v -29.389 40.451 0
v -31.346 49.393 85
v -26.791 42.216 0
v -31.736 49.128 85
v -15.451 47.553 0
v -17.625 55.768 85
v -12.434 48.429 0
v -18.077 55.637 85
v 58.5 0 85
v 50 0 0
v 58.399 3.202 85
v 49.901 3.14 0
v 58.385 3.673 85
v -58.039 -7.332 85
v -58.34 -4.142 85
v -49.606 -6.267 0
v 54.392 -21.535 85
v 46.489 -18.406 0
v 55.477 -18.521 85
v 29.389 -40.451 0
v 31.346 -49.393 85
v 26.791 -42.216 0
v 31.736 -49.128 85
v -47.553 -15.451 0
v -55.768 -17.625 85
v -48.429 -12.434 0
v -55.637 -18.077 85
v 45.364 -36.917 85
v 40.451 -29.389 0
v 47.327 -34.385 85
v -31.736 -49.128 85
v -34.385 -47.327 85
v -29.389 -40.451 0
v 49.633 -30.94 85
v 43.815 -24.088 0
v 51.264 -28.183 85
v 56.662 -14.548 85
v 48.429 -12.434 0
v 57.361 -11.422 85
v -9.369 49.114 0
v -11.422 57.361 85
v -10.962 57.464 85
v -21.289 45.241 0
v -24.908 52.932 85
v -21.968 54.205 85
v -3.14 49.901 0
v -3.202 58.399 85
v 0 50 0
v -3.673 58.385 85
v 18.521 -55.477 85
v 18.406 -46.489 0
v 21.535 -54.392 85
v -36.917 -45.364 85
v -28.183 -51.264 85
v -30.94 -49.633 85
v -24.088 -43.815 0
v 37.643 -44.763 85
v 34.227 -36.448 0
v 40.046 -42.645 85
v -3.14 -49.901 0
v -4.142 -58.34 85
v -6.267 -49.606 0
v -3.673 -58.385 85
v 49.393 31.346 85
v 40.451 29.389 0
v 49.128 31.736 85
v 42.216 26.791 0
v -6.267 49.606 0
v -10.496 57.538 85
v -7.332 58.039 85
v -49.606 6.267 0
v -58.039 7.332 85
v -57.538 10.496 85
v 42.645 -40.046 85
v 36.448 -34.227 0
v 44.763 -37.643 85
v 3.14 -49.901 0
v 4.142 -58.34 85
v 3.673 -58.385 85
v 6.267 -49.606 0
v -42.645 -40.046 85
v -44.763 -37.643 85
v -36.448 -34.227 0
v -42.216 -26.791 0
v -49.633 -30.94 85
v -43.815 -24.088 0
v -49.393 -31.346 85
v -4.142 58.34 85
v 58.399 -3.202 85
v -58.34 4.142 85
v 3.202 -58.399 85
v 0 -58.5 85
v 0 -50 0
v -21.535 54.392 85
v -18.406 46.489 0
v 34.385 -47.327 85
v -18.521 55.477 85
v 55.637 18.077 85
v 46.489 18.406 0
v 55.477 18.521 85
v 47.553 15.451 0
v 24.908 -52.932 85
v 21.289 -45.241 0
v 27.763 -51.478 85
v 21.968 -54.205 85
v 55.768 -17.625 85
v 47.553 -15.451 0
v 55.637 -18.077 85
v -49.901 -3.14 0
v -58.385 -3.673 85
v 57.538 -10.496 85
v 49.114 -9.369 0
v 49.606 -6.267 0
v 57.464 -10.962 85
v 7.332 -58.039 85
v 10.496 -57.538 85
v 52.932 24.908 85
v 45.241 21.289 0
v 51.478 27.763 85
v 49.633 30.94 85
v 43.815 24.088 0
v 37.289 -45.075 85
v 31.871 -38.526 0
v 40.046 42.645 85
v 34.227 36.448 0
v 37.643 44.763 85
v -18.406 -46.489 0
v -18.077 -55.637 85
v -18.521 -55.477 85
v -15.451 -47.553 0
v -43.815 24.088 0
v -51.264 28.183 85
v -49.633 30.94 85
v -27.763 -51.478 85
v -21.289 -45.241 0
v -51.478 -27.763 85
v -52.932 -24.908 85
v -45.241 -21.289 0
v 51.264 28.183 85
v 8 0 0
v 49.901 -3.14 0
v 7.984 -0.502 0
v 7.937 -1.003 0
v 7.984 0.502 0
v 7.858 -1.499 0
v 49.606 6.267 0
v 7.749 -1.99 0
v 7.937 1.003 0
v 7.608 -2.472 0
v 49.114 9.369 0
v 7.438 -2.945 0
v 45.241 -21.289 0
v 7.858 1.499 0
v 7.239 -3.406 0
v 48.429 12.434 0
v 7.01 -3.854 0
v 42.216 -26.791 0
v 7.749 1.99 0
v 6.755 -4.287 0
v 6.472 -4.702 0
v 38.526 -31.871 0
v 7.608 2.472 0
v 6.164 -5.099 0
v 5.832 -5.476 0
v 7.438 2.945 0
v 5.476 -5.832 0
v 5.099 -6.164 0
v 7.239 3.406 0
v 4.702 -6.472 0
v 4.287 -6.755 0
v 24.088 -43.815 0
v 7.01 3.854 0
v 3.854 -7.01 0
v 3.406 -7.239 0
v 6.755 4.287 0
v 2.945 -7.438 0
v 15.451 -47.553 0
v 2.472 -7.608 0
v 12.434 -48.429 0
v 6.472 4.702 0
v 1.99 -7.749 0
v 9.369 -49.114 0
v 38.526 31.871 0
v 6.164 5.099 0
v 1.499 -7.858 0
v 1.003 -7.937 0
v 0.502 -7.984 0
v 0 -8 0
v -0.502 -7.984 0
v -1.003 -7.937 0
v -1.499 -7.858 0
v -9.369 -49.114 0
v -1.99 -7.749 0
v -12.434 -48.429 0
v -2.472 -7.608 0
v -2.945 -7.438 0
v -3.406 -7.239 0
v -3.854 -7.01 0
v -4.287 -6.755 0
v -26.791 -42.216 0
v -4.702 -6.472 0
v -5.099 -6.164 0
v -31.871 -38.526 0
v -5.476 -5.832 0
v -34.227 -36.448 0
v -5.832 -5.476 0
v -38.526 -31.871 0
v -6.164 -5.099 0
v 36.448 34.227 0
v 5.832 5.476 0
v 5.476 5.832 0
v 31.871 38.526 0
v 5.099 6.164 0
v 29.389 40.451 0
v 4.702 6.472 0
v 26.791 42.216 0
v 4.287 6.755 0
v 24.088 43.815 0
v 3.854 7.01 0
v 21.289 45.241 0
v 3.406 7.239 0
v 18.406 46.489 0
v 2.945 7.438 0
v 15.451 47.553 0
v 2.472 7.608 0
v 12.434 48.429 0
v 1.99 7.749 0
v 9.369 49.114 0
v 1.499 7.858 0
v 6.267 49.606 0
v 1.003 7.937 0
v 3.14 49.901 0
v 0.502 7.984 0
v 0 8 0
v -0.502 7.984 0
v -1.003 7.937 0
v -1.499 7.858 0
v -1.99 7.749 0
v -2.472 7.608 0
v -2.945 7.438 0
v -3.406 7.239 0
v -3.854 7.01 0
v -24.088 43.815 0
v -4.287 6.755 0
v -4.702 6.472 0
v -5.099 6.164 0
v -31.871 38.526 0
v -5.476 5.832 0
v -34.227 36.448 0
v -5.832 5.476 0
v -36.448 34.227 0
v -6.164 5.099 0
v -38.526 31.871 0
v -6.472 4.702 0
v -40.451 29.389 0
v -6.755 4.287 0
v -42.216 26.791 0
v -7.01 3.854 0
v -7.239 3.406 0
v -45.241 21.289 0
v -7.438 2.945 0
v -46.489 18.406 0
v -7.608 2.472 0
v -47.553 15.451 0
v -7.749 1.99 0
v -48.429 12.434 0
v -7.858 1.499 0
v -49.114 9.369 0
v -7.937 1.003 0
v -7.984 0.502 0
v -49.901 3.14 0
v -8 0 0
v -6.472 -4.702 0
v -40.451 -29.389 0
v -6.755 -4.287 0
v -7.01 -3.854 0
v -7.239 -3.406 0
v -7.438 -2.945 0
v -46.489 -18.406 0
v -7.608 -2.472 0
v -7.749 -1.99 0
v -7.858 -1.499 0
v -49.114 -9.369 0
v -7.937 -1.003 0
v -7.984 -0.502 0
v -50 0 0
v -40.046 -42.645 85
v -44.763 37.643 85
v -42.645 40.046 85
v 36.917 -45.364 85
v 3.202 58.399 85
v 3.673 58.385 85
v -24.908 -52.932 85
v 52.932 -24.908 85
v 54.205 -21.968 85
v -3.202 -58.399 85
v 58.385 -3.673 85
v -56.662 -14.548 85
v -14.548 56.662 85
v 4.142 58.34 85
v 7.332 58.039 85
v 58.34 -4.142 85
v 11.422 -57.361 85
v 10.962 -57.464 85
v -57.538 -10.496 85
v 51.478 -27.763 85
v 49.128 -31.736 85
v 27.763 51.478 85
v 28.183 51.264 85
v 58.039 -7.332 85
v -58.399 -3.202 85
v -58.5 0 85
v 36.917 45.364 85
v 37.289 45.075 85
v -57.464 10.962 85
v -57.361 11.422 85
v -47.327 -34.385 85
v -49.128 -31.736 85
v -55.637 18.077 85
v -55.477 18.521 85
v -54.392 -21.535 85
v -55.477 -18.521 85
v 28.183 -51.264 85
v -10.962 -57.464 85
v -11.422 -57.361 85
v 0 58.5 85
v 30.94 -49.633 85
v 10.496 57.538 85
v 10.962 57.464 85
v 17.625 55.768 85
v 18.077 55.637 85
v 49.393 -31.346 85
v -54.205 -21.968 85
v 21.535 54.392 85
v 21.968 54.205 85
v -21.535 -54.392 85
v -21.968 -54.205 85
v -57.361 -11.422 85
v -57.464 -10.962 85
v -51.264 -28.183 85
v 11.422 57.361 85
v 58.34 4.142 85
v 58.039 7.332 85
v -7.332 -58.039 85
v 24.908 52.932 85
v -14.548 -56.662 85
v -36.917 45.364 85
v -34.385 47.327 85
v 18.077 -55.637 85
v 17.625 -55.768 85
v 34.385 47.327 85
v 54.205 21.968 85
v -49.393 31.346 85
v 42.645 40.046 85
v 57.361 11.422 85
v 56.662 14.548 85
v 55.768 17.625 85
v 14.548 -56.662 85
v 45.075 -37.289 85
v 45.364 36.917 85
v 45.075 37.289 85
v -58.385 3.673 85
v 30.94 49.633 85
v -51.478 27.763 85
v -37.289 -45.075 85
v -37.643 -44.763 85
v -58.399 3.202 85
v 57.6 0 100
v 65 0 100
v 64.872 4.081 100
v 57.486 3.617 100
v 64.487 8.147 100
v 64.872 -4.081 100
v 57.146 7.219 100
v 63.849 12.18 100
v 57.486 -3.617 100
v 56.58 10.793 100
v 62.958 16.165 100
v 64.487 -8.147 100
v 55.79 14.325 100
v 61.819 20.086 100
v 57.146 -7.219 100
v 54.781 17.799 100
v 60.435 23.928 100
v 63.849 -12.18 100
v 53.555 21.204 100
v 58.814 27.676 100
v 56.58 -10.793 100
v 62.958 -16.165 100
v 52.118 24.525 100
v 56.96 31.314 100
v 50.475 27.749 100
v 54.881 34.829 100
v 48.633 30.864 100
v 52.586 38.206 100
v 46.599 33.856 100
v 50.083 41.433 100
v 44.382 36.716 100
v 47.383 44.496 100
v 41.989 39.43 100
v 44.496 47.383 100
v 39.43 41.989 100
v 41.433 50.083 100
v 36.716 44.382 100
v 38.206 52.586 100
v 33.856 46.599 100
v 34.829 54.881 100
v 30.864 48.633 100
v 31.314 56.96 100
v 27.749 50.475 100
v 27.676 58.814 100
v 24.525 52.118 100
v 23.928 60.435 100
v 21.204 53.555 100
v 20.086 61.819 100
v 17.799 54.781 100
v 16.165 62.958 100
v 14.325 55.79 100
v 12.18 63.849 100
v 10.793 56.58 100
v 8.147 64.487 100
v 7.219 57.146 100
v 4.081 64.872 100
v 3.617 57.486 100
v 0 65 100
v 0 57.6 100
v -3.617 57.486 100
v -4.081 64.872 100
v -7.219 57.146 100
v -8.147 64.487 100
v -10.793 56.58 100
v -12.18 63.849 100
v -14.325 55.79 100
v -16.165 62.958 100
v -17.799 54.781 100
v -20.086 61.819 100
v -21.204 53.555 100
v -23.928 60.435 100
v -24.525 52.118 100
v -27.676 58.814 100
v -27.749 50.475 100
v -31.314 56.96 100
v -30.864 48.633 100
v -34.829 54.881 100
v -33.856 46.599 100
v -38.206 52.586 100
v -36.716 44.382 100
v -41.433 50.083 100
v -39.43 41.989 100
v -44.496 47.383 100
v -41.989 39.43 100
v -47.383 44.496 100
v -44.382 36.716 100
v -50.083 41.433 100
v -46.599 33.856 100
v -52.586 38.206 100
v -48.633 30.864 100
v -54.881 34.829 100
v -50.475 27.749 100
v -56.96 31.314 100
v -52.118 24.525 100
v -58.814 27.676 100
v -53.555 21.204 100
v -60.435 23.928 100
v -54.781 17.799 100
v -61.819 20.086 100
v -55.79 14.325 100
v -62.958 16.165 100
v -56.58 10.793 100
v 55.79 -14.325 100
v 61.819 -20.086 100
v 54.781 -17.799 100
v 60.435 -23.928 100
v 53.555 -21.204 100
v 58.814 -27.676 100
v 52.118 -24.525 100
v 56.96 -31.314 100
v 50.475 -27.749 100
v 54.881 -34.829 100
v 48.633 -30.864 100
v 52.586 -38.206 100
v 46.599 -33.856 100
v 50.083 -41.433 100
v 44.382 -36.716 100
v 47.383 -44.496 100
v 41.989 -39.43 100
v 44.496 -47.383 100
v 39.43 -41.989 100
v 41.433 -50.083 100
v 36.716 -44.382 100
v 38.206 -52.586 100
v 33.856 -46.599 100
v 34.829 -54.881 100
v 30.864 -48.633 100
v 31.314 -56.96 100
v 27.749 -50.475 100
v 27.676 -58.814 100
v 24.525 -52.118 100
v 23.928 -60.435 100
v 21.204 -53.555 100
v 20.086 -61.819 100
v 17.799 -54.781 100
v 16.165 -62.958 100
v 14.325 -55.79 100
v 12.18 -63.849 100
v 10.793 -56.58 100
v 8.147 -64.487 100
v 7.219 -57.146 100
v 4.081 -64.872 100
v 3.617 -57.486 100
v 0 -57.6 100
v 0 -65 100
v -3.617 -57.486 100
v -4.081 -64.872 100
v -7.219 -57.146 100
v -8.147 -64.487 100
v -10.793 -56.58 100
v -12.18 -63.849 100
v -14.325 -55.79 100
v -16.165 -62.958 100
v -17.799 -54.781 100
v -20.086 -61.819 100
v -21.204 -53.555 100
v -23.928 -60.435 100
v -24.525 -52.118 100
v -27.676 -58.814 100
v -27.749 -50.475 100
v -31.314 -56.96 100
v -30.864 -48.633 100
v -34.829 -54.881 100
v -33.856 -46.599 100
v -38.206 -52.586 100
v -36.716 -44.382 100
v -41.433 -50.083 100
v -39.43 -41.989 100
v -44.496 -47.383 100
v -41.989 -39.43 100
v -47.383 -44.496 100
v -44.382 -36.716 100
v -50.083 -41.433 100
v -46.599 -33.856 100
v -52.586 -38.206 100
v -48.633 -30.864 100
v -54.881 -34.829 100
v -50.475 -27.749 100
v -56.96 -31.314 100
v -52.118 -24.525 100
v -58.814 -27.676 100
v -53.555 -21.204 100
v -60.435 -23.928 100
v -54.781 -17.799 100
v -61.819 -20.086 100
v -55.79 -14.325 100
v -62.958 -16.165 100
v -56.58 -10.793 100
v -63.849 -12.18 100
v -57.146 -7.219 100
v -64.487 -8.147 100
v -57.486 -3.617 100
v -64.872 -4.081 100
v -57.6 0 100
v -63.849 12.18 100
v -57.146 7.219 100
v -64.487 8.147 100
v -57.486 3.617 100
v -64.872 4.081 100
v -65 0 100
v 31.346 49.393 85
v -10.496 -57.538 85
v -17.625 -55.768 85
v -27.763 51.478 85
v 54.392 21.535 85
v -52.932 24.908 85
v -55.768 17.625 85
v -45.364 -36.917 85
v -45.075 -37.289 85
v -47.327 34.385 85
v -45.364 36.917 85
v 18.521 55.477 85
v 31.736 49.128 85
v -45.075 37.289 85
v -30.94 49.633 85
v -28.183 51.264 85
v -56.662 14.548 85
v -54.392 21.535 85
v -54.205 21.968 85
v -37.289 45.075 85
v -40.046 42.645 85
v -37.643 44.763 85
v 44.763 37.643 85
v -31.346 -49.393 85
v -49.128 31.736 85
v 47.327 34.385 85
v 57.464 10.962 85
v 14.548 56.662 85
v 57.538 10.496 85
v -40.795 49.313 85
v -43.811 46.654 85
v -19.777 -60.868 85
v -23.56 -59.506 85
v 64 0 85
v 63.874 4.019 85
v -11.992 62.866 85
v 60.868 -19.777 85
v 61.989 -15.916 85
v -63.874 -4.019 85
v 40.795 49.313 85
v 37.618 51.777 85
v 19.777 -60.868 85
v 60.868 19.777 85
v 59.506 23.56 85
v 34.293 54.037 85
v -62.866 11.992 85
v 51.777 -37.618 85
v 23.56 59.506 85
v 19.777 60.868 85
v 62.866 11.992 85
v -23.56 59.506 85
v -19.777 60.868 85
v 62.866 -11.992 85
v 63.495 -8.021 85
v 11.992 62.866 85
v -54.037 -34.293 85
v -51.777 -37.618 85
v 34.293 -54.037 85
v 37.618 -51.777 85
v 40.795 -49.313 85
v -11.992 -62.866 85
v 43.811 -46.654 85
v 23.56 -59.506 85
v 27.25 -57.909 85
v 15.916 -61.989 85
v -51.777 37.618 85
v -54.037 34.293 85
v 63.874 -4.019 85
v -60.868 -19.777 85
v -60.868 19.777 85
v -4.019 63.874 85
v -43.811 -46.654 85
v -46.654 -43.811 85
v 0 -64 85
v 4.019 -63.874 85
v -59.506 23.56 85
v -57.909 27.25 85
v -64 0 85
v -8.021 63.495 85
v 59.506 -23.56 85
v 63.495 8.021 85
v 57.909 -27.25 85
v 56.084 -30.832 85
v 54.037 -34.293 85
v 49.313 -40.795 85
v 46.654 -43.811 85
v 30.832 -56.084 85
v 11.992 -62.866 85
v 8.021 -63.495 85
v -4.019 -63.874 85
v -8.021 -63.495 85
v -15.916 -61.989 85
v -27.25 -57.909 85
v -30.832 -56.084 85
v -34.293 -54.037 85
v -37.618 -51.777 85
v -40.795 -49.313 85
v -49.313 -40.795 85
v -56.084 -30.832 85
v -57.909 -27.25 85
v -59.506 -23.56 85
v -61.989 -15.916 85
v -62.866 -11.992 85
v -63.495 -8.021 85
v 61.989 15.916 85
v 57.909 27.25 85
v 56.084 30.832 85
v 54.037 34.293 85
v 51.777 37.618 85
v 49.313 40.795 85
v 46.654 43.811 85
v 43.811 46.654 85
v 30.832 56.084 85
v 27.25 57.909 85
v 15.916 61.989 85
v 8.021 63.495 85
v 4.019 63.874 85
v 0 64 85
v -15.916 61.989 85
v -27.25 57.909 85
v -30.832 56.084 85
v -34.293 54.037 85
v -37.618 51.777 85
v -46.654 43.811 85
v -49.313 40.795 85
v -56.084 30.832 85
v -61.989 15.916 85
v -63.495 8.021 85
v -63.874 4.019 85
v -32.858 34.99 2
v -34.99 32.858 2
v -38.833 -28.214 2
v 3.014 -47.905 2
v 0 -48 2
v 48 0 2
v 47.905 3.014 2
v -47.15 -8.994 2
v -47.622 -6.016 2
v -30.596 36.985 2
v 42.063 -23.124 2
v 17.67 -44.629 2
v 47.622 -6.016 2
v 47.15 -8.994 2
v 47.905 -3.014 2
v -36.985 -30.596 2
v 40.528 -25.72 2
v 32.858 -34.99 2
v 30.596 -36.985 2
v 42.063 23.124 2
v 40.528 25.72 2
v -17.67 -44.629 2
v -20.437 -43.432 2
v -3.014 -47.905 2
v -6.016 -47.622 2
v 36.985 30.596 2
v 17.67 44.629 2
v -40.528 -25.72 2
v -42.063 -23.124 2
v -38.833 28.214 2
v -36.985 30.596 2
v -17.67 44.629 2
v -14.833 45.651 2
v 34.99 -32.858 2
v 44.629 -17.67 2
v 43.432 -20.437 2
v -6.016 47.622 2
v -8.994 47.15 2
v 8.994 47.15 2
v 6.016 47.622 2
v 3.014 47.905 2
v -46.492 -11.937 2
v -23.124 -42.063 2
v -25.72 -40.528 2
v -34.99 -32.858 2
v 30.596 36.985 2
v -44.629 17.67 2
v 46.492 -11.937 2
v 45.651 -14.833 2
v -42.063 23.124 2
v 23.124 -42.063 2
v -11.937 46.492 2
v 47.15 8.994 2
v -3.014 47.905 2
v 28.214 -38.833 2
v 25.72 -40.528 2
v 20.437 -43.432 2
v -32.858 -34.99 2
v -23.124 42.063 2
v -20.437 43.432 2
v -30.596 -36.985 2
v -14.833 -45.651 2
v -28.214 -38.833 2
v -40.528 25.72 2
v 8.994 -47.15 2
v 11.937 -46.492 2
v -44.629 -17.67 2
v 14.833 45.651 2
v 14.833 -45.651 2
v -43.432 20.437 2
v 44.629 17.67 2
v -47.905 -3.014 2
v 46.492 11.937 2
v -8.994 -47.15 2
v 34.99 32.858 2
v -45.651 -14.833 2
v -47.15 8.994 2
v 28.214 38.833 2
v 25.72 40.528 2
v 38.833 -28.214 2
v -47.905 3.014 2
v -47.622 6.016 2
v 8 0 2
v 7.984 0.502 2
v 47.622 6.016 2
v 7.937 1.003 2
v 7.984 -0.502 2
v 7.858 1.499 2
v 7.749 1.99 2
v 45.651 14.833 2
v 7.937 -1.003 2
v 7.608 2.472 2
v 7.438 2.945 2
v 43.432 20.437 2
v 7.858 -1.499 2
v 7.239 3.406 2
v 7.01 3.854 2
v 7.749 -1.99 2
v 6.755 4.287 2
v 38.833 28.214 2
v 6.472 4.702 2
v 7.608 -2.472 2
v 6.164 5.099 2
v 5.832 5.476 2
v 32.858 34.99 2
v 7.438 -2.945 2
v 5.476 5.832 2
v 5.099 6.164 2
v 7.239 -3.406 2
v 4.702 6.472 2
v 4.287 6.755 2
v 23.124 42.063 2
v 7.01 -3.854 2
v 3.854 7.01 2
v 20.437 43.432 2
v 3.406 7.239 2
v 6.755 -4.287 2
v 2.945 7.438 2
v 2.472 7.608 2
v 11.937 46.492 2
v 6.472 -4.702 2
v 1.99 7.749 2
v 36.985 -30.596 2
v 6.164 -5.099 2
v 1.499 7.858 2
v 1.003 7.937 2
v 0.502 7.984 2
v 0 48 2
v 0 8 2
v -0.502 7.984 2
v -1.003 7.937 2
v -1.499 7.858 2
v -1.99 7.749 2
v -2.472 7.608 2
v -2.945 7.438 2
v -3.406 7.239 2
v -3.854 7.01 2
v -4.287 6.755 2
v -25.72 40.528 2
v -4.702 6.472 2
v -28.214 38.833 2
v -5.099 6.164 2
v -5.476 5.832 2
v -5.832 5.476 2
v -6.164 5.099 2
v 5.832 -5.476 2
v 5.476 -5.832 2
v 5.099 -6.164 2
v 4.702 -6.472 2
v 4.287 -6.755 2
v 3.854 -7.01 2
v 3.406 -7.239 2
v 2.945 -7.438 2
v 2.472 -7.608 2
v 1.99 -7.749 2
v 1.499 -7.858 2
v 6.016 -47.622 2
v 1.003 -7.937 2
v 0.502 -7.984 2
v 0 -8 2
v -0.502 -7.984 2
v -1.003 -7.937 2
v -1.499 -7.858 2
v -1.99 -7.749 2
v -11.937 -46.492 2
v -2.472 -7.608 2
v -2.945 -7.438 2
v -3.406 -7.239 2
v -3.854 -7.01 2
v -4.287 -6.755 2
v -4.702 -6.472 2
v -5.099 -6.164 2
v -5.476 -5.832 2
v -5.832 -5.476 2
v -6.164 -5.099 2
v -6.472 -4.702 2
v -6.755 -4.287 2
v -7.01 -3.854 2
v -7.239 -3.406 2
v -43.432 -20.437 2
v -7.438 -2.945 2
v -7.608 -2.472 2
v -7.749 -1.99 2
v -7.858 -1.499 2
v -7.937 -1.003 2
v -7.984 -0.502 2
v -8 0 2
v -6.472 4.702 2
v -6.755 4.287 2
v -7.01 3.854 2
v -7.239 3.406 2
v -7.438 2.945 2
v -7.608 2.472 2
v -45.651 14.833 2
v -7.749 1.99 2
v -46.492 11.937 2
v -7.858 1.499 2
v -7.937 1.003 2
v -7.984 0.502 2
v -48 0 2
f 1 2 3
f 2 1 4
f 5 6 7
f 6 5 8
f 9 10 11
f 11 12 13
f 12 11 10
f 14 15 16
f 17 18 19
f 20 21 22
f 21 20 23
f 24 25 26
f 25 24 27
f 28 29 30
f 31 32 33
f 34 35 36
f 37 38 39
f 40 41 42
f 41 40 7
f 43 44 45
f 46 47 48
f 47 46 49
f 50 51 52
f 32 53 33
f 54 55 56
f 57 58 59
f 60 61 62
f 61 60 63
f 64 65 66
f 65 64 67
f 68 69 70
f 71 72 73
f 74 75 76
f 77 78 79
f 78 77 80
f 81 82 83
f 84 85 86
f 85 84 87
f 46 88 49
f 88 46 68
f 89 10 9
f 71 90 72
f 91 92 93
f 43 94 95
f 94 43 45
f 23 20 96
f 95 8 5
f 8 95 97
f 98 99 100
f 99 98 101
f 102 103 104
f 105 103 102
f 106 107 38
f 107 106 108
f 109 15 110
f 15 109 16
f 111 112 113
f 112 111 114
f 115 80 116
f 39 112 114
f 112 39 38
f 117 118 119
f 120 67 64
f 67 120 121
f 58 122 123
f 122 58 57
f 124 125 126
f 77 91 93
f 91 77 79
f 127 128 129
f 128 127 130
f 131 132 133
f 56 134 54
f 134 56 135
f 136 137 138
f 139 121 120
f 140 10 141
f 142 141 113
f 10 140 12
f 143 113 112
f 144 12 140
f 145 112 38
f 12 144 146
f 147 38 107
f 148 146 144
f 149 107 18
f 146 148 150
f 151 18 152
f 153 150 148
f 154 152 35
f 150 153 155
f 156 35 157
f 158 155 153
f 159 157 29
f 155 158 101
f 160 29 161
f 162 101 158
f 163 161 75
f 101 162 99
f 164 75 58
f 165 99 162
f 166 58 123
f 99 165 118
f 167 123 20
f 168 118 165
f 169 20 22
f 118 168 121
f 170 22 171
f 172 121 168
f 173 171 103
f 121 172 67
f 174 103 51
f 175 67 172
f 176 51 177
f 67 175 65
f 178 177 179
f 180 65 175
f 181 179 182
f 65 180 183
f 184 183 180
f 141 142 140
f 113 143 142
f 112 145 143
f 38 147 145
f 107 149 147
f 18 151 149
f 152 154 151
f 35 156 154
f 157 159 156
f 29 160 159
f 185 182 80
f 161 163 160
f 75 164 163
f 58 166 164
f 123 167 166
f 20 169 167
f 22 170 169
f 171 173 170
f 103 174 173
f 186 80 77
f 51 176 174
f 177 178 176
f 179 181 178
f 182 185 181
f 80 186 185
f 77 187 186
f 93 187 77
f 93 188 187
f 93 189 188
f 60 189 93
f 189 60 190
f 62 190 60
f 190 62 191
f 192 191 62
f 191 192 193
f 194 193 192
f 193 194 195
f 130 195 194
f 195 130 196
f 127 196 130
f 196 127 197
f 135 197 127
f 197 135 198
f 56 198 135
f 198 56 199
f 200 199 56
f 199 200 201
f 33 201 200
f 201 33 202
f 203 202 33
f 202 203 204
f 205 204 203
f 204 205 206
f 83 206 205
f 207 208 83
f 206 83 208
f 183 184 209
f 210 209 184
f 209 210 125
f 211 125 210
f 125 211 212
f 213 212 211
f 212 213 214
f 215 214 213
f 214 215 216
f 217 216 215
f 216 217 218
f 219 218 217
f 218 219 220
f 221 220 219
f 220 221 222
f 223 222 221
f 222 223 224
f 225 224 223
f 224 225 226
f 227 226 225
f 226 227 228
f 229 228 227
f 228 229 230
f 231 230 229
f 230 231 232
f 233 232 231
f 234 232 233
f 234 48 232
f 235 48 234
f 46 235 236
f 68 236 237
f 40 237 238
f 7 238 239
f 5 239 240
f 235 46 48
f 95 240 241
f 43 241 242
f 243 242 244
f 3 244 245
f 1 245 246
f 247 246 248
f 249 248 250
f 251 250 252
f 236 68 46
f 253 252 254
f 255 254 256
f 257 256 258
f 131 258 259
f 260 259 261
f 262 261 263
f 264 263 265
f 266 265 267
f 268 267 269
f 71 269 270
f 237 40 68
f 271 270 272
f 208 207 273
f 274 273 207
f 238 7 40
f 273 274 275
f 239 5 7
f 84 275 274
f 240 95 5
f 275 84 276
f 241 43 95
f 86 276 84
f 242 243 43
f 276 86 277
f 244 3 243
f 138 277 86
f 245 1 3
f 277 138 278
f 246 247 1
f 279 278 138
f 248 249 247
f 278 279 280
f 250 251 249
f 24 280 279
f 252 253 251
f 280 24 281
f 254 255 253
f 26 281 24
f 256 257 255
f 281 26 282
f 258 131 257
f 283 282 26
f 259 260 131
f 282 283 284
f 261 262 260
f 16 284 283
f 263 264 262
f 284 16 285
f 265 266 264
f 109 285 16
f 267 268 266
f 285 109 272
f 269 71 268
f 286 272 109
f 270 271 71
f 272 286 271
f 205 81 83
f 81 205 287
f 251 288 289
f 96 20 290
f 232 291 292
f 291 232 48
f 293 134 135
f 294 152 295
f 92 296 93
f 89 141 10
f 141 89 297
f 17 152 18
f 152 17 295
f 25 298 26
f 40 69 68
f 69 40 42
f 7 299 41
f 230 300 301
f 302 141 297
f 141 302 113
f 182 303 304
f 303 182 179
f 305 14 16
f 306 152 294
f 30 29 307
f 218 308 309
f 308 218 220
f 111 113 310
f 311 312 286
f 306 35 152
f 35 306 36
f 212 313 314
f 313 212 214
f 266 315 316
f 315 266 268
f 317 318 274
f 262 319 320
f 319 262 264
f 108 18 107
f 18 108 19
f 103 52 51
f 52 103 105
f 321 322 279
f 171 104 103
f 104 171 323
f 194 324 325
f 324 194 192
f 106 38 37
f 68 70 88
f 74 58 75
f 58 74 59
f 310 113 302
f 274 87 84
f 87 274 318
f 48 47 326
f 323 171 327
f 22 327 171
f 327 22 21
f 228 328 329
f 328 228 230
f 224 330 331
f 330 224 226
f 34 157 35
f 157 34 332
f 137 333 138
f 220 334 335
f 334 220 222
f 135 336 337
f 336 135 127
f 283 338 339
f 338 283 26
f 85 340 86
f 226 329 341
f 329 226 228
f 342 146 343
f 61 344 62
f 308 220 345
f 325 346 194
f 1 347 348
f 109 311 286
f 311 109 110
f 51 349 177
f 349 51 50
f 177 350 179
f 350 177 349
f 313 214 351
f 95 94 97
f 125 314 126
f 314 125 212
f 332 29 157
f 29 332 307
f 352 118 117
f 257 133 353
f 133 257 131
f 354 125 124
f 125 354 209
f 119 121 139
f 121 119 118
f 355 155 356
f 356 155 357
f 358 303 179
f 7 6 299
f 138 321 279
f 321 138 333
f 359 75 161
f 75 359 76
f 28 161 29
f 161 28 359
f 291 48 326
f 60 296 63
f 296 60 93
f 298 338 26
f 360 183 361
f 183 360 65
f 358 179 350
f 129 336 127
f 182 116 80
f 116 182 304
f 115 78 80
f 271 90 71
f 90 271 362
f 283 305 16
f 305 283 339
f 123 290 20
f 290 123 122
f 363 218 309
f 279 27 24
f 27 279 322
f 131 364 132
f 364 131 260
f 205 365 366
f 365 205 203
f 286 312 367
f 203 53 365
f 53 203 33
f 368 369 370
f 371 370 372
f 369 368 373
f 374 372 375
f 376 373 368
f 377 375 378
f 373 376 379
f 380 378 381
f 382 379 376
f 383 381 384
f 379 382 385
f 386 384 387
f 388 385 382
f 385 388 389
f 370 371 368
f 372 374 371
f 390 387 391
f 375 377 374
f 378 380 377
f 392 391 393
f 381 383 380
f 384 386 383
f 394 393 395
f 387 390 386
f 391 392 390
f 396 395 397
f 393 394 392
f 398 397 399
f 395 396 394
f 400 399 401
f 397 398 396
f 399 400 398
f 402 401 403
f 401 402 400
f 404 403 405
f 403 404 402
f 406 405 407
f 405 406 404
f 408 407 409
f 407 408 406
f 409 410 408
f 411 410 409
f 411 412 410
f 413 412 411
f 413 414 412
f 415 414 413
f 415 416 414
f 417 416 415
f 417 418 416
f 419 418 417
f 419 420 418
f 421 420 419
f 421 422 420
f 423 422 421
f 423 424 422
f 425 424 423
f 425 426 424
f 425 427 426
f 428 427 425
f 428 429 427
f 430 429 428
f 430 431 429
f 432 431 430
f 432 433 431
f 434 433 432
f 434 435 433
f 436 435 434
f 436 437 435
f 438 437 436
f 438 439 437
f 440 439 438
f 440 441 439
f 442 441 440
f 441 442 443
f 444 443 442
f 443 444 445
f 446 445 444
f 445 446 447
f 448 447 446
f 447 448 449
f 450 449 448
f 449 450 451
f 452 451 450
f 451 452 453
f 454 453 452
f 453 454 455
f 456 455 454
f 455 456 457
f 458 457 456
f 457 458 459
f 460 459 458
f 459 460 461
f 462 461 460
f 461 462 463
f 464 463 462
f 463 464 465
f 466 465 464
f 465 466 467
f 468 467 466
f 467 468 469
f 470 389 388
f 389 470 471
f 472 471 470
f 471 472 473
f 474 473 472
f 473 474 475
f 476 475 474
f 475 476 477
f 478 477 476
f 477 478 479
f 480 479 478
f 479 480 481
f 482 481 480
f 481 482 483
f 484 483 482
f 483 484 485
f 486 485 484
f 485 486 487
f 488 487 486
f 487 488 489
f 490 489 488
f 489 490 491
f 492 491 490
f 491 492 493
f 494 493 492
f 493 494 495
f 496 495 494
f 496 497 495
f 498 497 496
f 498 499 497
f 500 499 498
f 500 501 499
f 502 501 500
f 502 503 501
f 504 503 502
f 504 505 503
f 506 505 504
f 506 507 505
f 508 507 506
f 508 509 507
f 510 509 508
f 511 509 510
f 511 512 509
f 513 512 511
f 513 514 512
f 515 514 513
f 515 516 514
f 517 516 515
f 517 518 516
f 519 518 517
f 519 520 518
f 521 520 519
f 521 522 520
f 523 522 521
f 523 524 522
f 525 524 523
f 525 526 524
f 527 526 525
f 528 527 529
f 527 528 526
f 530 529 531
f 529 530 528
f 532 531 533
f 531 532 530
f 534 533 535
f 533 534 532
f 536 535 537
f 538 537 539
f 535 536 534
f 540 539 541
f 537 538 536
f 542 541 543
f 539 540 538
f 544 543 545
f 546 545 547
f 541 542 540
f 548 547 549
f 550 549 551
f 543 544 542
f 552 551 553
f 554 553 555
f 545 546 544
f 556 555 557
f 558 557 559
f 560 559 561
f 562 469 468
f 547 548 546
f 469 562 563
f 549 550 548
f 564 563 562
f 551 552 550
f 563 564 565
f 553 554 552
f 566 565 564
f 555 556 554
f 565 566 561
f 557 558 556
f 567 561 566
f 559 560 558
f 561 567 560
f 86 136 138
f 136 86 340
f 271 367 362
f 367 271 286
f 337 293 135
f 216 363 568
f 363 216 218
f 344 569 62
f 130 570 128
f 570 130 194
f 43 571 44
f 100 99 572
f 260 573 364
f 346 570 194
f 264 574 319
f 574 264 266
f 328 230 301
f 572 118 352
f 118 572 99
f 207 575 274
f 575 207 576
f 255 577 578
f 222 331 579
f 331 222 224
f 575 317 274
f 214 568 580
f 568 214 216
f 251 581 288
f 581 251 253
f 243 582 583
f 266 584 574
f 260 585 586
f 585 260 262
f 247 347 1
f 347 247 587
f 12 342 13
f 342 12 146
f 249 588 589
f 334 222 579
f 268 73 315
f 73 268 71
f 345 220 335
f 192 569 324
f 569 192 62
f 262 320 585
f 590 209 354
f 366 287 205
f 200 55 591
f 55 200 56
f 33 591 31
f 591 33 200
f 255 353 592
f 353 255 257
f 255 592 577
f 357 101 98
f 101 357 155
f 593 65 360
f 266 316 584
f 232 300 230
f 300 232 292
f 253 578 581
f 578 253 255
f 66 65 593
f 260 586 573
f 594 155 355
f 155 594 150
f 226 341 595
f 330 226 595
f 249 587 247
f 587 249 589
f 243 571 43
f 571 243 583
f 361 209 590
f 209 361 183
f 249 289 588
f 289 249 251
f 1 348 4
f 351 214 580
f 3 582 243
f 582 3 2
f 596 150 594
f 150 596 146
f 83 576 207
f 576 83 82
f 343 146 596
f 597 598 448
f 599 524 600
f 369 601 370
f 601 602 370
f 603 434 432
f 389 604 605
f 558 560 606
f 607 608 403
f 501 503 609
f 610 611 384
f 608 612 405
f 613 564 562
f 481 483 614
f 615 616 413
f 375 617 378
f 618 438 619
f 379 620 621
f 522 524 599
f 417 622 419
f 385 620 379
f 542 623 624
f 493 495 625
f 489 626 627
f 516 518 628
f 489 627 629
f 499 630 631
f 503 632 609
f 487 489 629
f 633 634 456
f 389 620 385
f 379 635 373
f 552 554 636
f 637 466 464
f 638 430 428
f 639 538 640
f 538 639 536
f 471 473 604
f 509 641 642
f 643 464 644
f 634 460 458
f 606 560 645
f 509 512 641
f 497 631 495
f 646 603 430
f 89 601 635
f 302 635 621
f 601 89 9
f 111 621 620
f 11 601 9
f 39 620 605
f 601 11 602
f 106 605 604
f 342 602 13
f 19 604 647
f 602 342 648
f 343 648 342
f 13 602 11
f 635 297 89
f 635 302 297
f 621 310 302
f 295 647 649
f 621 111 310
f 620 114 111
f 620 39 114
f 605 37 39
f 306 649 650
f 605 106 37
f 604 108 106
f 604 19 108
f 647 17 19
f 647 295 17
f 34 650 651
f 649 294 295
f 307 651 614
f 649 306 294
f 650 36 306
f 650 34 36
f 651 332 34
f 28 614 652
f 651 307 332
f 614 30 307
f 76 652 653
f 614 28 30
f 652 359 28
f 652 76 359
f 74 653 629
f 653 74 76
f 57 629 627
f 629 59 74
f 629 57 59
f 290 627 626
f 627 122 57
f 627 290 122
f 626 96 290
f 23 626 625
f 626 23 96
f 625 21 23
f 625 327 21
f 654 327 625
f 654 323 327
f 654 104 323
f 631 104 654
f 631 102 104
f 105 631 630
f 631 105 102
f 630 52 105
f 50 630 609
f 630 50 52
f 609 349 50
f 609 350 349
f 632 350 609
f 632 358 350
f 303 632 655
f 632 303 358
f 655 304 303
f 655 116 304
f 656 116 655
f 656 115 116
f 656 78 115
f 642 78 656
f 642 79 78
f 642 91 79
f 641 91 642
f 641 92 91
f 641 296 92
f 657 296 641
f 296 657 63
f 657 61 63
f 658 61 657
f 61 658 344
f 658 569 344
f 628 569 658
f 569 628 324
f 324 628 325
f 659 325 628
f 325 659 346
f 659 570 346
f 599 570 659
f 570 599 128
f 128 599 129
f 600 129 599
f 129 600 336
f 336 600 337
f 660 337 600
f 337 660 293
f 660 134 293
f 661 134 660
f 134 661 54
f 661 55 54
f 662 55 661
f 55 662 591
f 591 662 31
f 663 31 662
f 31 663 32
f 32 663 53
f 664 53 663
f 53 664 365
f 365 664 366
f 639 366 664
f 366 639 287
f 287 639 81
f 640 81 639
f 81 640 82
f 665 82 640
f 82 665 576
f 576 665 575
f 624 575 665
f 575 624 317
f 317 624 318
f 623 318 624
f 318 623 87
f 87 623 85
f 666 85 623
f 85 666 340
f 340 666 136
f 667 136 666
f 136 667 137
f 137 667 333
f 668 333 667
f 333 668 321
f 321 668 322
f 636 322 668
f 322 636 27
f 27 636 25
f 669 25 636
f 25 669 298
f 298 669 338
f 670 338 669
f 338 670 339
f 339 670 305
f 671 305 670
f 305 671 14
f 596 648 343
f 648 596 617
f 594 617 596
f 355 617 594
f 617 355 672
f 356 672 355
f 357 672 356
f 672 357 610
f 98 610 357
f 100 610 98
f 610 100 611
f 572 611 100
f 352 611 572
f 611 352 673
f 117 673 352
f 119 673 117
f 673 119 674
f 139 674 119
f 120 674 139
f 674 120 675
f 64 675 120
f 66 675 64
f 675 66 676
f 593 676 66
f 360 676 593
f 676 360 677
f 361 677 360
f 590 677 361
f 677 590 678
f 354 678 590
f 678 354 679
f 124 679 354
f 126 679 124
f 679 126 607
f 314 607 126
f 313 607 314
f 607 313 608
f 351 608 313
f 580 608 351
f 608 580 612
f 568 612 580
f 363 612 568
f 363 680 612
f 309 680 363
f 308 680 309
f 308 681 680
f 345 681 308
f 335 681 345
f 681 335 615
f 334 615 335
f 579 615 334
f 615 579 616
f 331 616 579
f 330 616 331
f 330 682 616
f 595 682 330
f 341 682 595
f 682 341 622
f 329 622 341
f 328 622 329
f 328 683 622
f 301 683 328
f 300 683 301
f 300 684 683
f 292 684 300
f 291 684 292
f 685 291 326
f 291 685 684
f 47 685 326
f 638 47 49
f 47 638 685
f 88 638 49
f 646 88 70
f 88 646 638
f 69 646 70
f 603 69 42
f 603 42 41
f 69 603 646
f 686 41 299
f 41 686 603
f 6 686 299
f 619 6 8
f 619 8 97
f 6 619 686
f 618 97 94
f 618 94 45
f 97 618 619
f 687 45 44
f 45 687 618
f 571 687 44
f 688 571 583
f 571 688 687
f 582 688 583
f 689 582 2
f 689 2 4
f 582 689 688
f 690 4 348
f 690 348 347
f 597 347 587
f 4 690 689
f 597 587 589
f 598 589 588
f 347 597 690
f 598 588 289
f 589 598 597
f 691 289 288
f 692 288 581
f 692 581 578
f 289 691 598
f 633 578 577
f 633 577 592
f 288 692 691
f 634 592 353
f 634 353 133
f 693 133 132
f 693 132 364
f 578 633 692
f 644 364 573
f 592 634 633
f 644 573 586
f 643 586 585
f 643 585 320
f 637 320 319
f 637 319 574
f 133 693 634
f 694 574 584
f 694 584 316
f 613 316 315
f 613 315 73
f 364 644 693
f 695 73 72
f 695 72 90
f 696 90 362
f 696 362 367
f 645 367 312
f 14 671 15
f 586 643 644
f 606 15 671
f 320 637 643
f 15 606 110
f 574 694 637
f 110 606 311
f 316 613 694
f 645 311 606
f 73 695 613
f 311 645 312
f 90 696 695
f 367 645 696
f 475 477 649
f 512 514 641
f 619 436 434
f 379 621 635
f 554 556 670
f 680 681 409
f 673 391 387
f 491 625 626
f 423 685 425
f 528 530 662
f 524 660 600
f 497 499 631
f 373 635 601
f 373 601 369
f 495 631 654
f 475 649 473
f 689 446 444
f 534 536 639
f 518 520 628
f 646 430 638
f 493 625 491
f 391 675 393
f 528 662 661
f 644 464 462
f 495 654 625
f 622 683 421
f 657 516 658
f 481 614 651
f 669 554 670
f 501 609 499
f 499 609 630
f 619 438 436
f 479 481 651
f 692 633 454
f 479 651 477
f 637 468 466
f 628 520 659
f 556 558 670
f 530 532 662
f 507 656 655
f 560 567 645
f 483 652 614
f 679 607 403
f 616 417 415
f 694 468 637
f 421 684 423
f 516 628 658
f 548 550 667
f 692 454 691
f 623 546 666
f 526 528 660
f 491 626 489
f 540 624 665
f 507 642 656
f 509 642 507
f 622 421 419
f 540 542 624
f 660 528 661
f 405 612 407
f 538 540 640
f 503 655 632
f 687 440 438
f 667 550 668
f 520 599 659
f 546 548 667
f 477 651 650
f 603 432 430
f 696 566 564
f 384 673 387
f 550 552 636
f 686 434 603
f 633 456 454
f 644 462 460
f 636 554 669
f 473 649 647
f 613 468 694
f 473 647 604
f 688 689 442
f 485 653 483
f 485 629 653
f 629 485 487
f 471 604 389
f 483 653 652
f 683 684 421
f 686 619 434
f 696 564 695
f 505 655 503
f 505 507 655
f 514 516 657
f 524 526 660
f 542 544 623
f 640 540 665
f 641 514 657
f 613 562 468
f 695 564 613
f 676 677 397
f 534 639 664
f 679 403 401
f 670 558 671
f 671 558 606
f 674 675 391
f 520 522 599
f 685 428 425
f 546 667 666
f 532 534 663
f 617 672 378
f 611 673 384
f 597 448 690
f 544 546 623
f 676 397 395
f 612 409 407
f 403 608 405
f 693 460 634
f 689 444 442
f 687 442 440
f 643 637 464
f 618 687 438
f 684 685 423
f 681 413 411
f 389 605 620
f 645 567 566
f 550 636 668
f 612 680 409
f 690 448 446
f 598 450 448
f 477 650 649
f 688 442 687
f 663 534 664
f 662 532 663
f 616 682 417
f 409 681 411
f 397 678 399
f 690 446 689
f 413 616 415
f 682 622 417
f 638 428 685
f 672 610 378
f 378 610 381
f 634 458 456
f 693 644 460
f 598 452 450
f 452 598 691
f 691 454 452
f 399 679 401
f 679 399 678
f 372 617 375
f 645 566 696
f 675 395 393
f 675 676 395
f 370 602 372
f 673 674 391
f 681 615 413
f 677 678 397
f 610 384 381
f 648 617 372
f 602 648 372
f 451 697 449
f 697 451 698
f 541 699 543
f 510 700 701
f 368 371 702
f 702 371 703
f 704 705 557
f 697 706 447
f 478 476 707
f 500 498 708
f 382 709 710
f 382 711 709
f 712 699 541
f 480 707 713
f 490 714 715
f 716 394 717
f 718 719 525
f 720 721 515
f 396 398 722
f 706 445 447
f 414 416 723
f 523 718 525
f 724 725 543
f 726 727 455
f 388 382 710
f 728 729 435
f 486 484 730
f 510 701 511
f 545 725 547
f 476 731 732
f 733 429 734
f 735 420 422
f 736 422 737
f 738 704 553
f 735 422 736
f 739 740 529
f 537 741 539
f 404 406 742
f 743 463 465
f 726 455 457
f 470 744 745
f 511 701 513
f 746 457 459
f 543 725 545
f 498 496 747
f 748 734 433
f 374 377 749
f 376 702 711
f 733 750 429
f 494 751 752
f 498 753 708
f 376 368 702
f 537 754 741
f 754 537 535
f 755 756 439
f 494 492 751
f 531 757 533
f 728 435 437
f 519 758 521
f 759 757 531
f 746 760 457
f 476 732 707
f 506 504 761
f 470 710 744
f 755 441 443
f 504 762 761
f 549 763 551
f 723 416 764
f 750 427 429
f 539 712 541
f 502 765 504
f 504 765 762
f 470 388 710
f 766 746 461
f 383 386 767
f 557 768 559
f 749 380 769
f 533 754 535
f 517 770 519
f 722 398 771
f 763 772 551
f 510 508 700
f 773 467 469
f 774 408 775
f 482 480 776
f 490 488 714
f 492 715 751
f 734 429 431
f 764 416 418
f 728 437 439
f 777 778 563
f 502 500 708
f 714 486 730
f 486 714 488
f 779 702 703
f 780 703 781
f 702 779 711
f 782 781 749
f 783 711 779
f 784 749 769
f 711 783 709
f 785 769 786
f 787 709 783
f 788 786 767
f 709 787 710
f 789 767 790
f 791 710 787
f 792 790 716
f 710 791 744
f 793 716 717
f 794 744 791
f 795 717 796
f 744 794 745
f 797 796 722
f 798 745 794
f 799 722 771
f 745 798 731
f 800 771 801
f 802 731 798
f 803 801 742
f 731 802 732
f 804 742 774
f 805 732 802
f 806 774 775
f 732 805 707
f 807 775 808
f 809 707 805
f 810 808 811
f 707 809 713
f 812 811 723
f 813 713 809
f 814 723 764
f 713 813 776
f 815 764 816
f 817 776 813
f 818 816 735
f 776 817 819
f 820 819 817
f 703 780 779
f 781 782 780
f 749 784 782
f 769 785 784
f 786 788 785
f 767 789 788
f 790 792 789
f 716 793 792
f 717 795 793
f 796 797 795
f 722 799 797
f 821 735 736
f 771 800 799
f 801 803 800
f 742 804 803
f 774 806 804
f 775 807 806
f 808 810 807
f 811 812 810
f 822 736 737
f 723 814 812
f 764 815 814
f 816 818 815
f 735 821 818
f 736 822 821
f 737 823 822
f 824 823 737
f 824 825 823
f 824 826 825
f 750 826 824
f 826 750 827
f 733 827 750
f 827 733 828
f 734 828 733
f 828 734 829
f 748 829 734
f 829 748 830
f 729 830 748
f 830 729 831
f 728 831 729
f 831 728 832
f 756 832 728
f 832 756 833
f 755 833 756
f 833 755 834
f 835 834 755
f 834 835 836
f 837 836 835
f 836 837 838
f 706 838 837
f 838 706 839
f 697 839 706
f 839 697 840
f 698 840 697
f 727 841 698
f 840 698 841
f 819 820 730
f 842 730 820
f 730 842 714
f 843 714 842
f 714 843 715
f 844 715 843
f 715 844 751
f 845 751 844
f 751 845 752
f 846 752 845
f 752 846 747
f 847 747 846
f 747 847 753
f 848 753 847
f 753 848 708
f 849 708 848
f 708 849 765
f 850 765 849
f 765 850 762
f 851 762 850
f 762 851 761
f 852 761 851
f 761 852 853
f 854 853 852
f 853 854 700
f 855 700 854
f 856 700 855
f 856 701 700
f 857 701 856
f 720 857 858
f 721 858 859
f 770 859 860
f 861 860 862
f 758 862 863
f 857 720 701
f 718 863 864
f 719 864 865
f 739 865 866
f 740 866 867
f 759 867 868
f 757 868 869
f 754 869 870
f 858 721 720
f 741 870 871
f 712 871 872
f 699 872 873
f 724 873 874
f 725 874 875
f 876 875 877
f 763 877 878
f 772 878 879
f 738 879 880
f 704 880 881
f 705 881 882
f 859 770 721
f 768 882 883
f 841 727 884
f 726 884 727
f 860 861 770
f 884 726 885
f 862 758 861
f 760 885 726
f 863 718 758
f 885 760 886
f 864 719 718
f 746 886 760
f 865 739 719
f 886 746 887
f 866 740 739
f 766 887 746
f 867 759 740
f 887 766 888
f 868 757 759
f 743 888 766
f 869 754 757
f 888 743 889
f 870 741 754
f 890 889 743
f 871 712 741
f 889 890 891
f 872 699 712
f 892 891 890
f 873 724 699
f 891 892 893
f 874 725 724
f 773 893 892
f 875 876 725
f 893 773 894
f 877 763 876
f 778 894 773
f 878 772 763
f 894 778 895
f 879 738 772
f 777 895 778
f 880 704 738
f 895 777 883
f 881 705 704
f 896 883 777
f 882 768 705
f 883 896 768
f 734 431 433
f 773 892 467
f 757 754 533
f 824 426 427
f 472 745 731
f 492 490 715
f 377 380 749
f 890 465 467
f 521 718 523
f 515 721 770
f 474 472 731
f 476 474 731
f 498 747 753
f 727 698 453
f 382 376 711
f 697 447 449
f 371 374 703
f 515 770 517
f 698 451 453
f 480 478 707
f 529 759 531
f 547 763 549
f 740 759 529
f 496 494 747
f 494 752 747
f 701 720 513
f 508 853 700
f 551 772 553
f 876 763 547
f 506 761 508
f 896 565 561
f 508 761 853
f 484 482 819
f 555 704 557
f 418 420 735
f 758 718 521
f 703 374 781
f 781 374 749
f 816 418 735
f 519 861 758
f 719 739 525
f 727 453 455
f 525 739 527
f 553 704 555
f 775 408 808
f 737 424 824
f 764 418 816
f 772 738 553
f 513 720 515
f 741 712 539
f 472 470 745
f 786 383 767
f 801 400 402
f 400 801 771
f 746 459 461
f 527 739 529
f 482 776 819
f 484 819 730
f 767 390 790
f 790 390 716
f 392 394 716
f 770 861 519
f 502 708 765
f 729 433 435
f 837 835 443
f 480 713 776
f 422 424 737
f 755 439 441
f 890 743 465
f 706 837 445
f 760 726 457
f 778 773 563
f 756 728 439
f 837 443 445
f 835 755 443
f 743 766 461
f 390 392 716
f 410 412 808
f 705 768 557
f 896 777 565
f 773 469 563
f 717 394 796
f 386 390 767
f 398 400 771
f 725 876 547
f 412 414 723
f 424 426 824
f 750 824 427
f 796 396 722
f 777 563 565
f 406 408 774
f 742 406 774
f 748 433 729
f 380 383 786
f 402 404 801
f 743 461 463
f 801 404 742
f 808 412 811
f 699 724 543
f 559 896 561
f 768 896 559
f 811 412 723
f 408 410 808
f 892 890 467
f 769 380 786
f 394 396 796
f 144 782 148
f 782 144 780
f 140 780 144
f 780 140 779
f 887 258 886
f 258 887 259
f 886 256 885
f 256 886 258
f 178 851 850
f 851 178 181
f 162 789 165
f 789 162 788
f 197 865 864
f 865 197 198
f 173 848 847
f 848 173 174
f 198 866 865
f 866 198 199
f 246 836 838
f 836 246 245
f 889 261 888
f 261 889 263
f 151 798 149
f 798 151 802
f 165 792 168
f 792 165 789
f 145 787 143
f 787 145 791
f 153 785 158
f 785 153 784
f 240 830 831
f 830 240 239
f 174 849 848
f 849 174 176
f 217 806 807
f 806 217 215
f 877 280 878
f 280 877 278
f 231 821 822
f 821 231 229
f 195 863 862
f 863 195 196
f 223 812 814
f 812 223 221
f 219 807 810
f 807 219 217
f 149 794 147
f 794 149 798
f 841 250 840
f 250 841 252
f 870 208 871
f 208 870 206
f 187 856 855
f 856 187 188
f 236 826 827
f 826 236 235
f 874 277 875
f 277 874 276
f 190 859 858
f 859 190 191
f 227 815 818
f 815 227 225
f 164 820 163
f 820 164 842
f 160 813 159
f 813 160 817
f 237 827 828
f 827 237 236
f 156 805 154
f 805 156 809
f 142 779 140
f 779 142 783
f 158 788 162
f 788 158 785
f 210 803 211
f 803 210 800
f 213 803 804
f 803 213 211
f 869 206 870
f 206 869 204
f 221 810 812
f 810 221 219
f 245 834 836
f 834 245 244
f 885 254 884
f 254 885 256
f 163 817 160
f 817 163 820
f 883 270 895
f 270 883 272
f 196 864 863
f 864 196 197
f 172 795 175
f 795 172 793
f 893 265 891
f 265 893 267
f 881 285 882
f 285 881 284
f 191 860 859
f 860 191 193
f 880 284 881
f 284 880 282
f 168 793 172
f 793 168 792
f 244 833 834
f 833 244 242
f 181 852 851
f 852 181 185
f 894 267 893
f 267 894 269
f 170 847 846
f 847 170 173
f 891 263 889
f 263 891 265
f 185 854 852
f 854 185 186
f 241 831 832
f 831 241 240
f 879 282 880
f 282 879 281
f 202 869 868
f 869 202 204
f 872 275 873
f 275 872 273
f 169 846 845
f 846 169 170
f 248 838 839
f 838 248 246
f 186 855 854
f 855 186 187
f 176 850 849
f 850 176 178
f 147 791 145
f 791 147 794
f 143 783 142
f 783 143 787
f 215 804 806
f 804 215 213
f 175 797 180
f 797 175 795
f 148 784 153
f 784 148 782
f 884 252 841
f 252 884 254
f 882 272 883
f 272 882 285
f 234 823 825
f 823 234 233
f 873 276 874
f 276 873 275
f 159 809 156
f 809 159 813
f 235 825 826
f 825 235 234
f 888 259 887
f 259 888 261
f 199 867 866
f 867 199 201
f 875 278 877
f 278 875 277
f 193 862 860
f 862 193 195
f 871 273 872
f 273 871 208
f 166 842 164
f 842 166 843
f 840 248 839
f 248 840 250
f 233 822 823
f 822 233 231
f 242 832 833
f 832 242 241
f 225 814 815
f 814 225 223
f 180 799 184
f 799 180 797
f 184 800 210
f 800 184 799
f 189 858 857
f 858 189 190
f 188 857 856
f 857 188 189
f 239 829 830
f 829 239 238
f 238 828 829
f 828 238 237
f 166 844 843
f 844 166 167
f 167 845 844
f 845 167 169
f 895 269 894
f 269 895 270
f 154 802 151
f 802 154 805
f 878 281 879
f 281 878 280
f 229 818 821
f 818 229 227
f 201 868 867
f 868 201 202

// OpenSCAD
// variables
size = 100; // [50:S,100:M,150:L]
wallthickness = 2; // [1:S,2:M,3:L]
hole = 1; // [1:Yes,0;No]
resolution = 100; // [100:rough,150:middle,200:fine]


// model
difference(){
	difference(){
		union(){
			translate([0,0,0])cylinder(h = size, r1 = size/2, r2 = size*1.2/2, $fn = resolution);
			translate([0,0,size*0.85])cylinder(h = size*0.15, r1 = size*1.28/2, r2 = size*1.3/2, $fn = resolution);
		}
		translate([0,0,wallthickness])cylinder(h = size-wallthickness, r1 = (size-2*wallthickness)/2, r2 = (size-2*wallthickness)*1.2/2, $fn = resolution);
	}
	if(hole==1){
		cylinder(h = wallthickness, r1 = size*0.08, r2 = size*0.08, $fn = resolution);
	}
}

